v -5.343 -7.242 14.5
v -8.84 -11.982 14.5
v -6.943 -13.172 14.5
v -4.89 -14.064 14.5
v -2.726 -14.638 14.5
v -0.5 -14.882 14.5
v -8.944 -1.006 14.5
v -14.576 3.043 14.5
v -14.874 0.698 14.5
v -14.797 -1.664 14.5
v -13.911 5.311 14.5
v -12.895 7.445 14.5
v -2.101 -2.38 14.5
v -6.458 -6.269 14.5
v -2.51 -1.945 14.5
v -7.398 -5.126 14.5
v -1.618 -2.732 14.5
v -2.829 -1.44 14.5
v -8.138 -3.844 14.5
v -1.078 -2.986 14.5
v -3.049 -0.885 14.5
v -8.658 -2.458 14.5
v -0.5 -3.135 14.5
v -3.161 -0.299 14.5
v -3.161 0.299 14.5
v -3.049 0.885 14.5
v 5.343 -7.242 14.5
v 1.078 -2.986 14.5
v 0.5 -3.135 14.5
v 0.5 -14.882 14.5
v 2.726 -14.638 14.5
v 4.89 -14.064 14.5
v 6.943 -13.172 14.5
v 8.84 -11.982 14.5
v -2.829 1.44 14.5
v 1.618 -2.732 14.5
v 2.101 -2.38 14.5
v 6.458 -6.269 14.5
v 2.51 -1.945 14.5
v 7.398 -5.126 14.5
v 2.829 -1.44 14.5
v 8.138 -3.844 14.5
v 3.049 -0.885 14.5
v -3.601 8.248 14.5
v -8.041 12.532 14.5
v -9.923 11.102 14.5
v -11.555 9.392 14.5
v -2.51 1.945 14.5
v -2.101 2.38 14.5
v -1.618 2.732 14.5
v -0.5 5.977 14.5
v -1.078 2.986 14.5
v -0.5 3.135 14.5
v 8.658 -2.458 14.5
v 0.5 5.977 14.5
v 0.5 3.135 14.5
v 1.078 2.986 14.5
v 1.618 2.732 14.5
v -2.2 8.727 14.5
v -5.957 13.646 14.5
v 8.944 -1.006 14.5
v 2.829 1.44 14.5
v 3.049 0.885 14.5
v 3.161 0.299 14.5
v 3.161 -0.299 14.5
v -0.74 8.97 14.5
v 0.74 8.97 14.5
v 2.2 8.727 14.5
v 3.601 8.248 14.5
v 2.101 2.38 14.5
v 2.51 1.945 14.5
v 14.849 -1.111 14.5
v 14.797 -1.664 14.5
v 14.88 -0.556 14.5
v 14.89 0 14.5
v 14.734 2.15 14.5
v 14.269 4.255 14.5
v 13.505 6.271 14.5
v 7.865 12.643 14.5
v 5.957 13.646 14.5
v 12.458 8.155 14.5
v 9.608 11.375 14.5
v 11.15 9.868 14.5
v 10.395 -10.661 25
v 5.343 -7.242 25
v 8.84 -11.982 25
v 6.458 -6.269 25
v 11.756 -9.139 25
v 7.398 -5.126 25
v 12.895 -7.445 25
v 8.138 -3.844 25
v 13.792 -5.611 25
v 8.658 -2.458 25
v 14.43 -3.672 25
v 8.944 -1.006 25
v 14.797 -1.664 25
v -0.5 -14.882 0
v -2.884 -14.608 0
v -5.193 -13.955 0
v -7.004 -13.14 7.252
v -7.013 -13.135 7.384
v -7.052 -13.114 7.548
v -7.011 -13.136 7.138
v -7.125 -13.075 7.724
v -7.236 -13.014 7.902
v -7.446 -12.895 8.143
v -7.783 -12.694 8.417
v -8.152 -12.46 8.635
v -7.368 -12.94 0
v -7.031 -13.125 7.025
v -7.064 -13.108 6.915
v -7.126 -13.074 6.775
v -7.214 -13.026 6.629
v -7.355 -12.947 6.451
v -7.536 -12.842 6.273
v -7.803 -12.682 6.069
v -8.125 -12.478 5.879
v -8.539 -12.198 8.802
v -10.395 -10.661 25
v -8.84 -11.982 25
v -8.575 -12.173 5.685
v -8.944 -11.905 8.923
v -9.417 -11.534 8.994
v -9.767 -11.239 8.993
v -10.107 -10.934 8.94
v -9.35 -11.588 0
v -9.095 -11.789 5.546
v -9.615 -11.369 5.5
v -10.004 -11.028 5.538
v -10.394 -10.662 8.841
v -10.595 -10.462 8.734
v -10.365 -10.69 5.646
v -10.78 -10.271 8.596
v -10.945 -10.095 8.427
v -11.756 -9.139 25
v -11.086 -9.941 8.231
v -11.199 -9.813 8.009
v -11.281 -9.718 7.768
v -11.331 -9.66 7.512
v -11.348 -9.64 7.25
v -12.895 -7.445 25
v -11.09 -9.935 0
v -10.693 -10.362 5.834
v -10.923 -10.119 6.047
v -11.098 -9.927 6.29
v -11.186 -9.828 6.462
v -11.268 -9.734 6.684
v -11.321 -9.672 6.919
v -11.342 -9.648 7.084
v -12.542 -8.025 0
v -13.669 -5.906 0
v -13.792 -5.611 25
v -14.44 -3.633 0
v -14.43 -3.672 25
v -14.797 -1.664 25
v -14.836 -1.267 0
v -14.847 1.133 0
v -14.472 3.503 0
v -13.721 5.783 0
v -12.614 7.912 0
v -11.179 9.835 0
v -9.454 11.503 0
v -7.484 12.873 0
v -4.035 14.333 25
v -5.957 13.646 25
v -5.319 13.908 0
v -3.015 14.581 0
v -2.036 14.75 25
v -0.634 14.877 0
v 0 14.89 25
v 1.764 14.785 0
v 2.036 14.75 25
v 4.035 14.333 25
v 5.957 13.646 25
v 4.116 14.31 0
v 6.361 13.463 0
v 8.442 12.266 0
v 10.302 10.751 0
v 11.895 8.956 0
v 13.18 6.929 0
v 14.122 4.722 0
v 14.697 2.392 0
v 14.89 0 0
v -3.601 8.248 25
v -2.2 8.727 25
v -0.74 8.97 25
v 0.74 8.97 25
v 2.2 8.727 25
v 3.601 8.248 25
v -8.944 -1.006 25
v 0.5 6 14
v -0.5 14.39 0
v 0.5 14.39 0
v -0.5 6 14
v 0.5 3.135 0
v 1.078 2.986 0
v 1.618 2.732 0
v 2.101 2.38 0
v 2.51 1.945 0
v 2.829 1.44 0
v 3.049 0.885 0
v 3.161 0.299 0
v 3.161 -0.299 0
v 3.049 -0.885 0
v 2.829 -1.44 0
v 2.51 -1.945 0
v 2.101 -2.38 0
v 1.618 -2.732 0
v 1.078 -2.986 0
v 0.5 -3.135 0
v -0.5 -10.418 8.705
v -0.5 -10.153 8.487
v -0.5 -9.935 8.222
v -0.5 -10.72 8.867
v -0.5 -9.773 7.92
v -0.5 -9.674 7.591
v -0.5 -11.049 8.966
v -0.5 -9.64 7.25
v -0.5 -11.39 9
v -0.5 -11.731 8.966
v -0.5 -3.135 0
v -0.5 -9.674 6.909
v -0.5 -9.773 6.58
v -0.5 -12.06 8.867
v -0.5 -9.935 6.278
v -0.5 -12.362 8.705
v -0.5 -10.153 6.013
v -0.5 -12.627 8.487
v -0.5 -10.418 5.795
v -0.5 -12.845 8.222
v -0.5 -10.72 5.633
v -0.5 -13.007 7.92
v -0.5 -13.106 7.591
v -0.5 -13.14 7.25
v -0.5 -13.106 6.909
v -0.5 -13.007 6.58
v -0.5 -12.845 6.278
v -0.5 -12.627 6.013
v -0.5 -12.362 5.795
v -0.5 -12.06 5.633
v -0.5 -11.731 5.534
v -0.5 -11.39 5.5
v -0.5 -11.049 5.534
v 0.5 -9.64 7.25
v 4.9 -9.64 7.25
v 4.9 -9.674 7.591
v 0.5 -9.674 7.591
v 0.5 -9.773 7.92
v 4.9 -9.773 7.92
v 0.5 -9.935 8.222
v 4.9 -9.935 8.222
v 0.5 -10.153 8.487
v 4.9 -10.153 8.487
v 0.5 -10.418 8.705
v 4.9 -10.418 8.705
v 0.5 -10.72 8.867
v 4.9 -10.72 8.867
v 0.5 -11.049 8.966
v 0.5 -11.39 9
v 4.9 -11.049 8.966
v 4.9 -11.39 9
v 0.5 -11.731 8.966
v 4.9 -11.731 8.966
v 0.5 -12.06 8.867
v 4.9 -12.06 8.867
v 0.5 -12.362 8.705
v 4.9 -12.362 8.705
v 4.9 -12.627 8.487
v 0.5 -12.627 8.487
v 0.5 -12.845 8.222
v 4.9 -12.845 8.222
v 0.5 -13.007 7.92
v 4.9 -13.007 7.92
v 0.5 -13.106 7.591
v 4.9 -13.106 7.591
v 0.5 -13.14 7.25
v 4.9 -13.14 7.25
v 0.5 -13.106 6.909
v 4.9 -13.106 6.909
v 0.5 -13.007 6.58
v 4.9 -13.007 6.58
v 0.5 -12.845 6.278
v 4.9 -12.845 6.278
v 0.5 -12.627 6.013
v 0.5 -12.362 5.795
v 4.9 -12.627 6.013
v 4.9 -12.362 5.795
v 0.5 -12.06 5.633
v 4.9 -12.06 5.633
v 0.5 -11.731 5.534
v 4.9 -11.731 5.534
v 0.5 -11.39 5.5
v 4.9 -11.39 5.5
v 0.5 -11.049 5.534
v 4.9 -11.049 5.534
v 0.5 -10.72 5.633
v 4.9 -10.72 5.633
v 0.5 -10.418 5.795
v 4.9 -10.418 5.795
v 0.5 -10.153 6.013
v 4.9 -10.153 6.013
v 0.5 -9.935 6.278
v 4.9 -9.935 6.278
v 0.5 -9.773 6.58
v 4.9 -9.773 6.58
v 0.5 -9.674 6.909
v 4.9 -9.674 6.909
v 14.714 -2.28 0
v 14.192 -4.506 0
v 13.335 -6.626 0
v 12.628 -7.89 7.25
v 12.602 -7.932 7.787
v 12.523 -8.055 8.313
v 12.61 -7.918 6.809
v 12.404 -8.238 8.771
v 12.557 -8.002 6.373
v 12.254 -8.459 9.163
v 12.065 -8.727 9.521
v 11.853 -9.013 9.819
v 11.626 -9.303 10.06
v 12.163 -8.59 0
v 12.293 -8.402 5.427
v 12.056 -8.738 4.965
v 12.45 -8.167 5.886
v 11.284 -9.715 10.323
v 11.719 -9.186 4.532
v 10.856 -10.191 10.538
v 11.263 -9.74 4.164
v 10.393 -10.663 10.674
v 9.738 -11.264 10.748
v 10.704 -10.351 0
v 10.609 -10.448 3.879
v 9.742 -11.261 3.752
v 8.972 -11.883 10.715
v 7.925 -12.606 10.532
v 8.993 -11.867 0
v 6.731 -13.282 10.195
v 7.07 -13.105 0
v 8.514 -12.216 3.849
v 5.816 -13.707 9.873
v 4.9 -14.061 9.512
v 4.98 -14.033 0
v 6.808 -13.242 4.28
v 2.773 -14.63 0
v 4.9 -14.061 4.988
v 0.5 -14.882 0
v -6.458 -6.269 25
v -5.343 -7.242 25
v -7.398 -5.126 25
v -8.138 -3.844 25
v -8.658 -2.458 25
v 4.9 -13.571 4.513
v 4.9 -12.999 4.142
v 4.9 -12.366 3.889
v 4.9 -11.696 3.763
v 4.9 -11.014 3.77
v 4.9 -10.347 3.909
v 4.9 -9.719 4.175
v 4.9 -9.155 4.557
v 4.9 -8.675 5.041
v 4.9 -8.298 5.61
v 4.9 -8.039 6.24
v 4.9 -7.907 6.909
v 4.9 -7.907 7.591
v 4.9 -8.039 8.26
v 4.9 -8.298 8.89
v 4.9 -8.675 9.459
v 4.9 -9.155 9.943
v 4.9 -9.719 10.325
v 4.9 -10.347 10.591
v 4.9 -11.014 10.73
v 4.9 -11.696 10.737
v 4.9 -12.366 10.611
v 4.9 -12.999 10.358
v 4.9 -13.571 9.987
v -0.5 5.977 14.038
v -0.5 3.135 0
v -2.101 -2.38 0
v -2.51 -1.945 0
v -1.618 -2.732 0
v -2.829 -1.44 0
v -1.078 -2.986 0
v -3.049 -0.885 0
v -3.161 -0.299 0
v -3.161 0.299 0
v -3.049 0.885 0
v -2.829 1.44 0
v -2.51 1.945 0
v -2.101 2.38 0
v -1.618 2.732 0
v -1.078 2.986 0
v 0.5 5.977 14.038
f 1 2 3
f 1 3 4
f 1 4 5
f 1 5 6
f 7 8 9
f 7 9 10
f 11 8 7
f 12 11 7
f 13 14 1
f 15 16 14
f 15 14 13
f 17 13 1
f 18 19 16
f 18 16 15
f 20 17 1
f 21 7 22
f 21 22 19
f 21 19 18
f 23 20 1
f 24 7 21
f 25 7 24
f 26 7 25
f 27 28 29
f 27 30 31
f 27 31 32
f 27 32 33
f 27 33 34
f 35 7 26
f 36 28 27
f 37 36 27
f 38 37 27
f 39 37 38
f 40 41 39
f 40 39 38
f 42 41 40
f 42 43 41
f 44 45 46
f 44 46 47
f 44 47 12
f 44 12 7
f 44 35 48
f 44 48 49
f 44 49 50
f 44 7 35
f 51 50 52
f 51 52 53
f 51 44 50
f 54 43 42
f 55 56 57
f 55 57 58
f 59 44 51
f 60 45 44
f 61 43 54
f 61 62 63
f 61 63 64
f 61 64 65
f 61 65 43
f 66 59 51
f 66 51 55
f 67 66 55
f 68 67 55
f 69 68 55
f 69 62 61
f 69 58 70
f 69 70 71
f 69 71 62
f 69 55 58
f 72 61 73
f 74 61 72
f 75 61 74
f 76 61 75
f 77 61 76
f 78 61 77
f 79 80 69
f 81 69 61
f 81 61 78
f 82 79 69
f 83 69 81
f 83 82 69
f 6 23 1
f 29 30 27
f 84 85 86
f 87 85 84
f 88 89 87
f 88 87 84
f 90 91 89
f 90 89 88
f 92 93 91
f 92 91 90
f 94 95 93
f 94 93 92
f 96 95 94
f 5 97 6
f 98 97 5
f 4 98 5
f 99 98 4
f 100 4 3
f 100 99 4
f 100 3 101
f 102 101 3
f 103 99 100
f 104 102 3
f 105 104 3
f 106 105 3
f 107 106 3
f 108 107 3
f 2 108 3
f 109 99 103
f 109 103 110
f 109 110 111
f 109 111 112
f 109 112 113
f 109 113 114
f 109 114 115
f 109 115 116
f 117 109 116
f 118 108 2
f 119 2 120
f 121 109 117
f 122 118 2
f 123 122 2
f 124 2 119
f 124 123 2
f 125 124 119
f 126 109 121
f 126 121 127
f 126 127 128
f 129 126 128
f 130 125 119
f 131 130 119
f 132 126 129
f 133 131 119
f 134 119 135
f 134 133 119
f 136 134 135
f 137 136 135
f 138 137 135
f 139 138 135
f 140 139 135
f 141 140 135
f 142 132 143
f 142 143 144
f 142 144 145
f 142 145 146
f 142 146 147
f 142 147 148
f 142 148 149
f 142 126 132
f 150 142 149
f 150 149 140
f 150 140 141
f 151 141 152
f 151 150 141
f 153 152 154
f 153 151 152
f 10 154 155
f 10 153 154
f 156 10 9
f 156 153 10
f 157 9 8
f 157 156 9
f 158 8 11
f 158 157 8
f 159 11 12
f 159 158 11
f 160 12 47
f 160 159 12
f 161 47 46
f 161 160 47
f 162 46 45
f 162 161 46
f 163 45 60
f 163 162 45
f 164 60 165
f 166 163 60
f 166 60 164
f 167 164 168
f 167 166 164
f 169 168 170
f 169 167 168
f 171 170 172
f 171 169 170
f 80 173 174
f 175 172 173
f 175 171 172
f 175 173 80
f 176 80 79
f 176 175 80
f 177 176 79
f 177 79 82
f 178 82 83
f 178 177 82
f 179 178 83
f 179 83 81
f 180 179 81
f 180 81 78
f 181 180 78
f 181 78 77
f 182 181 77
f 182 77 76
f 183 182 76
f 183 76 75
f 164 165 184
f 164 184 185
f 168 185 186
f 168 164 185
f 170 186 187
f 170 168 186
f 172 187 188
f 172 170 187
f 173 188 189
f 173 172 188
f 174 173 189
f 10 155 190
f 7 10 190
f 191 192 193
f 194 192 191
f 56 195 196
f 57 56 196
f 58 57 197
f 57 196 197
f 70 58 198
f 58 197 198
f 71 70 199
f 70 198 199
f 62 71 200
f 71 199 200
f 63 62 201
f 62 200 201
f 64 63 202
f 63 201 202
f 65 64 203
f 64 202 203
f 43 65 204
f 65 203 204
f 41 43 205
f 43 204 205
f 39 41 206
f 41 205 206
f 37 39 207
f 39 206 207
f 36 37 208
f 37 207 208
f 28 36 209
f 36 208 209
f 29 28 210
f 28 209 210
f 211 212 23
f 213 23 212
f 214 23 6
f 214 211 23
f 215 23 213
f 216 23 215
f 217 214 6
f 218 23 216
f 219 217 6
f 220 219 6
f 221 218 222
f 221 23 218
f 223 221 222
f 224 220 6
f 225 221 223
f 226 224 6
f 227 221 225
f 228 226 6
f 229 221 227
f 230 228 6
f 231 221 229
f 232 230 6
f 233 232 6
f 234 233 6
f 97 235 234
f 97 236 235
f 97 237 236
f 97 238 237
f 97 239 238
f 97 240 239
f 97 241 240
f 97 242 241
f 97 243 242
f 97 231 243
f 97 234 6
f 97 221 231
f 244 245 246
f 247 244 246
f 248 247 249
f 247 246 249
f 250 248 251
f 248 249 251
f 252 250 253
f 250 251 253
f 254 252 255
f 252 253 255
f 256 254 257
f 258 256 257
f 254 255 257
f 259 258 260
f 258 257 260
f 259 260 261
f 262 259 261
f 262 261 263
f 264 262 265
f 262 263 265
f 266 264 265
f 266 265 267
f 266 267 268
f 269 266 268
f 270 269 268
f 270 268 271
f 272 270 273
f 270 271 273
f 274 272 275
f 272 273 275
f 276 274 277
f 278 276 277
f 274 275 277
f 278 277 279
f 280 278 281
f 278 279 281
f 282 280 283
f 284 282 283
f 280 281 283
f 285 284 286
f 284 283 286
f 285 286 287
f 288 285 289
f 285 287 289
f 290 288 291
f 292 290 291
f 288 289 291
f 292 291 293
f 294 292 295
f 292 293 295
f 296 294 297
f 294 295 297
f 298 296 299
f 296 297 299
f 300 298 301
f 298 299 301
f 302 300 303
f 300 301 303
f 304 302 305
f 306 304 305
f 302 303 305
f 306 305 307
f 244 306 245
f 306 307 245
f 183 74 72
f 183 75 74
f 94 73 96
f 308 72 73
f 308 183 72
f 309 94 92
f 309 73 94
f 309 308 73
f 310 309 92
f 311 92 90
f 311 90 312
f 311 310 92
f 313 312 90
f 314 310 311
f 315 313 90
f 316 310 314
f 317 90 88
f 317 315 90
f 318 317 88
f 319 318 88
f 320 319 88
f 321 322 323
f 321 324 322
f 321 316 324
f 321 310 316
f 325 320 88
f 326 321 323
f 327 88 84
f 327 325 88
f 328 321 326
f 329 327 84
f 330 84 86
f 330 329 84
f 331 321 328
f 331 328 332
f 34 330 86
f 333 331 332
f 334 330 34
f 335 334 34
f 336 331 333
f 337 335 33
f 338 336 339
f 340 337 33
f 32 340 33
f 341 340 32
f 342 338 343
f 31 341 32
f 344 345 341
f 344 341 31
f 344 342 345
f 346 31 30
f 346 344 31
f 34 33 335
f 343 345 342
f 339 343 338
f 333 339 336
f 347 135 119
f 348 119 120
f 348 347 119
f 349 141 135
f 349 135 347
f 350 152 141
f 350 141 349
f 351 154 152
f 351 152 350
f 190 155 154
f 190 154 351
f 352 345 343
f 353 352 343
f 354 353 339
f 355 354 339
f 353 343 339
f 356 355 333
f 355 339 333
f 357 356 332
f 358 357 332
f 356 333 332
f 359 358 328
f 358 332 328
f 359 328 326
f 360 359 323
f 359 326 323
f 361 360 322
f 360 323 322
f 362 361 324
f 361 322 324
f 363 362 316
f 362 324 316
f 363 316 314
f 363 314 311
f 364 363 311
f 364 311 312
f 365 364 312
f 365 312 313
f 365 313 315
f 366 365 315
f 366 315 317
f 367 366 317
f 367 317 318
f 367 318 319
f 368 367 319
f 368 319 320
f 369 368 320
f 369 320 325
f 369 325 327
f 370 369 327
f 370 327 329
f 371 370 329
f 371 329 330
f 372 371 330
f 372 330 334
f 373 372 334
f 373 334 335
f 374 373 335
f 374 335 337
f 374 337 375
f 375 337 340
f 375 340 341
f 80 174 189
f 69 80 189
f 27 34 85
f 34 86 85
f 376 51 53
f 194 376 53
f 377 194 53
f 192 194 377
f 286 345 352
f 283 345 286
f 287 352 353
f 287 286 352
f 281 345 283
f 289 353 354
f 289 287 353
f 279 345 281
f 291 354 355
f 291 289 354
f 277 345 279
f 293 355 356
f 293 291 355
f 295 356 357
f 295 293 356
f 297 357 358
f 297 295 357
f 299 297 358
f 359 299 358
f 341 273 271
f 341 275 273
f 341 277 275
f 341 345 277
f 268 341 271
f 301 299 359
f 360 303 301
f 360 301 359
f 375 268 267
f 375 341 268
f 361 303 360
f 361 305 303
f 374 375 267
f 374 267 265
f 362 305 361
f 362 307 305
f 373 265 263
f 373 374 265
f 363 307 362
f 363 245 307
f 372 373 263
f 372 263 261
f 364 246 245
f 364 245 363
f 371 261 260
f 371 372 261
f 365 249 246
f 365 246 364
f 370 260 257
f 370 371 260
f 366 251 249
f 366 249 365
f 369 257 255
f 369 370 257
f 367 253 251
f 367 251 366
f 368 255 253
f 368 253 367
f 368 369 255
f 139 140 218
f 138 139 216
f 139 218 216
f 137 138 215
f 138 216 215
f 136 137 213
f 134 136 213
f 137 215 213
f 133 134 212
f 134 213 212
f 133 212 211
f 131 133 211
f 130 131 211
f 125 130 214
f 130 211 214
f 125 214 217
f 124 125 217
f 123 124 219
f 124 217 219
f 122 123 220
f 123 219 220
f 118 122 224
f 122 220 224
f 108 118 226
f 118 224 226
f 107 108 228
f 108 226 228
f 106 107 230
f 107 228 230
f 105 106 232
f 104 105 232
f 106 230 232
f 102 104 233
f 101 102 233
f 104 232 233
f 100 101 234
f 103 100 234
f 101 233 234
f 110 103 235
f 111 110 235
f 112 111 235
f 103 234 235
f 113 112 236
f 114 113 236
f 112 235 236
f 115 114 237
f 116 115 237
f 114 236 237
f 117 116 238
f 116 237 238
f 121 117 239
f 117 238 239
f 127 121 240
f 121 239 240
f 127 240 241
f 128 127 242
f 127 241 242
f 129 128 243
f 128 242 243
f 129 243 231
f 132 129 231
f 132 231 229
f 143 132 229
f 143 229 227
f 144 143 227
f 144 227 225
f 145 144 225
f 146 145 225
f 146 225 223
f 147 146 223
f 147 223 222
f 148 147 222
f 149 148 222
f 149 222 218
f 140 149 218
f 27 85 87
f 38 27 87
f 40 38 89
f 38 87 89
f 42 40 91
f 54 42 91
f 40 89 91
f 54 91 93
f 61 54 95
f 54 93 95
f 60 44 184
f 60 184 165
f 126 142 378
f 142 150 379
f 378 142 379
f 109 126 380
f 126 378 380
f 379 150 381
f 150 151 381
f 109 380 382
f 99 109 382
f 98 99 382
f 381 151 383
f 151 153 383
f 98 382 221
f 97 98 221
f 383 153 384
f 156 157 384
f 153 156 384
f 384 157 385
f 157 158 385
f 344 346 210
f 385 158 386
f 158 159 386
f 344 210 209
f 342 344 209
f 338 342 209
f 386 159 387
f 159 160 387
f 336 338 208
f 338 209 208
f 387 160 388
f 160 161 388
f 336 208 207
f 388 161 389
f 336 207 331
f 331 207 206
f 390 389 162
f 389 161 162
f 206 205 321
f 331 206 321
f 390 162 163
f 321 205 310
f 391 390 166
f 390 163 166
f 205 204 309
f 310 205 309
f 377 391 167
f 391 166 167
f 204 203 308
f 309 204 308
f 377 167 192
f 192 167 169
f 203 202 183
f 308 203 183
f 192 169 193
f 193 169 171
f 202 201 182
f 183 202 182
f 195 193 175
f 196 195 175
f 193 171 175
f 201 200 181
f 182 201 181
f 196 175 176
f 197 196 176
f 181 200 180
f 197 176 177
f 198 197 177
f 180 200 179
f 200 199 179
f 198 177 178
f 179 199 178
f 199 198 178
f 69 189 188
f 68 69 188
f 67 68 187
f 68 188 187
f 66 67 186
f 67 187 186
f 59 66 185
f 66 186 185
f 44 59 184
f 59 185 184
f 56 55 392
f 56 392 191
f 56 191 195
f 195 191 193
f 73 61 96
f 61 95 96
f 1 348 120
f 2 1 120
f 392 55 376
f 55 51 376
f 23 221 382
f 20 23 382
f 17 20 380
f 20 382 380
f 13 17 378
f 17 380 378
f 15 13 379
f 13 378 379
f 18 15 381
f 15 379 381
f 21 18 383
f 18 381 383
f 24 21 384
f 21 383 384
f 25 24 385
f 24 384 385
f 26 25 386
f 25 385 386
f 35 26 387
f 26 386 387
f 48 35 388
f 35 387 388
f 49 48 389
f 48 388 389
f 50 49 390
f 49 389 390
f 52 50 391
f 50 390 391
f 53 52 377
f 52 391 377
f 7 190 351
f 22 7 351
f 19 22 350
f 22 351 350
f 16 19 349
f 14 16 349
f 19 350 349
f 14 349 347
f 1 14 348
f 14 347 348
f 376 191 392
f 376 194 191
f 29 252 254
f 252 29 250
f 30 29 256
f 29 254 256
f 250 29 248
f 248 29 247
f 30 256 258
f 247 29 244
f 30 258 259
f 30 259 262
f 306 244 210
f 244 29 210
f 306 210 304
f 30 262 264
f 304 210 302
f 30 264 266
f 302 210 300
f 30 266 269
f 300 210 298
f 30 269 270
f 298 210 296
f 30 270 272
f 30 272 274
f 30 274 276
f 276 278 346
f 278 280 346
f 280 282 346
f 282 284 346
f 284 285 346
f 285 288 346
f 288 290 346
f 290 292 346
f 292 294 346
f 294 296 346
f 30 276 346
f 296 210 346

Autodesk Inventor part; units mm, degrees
ref_plane "XZ Plane" through (0, 0, 0) normal (0, 1, 0) x (-1, 0, 0)
ref_plane "XY Plane" through (0, 0, 0) normal (0, 0, 1) x (1, 0, 0)
sketch "Sketch1" plane through (0, 0, 0) normal (0, 0, 1) x (1, 0, 0)
  circle A0 centre (0, 0) radius 14.89
  circle A1 centre (0, 0) radius 6
  circle A2 centre (0, 0) radius 3.175
  dimension "d0" = 29.78
  dimension "d1" = 12
  dimension "d41" = 6.35
extrude "Extrusion1" add sketch "Sketch1" along normal blind 25 contours A0 | A1
sketch "Sketch2" plane through (0, 0, 25) normal (0, 0, 1) x (1, 0, 0)
  circle A0 centre (0, 0) radius 14.89 projected
  circle A1 centre (0, 0) radius 9
  circle A2 centre (0, 0) radius 14.89 projected
  line L0 (-3.6007, 8.2483) -> (-5.9571, 13.6464)
  line L1 (5.9571, 13.6464) -> (3.6007, 8.2483)
  line L2 (-5.3429, -7.2425) -> (-8.8396, -11.9822)
  line L3 (-14.7967, -1.6642) -> (-8.9436, -1.0059)
  line L4 (8.9436, -1.0059) -> (14.7967, -1.6642)
  line L5 (8.8396, -11.9822) -> (5.3429, -7.2425)
  dimension "d14" = 18
  dimension "d24" = 360
extrude "Extrusion2" cut sketch "Sketch2" against normal blind 10.5 contours A0 L4 A1 L1 | L0 A1 L3 A0 | A1 | A0 L2 A1 L5
ref_plane "Work Plane1" through (14.9, 0, 0) normal (1, 0, 0) x (0, 1, 0)
sketch "Sketch3" plane through (14.9, 0, 0) normal (1, 0, 0) x (0, 1, 0)
  line L0 (-1.6642, 14.5) -> (-1.6642, 25) projected
  line L1 (-11.9822, 25) -> (-1.6642, 25) projected
  line L2 (-11.9822, 25) -> (-11.9822, 14.5) projected
  line L3 (-11.9822, 14.5) -> (-11.9822, 14.5) projected
  line L4 (-11.9822, 14.5) -> (-11.9822, 25) projected
  line L5 (-1.6642, 25) -> (-11.9822, 25) projected
  line L6 (-1.6642, 25) -> (-1.6642, 14.5) projected
  line L7 (-1.6642, 14.5) -> (13.6464, 14.5) projected
  line L8 (13.6464, 14.5) -> (13.6464, 25) projected
  line L9 (13.6464, 25) -> (13.6464, 25) projected
  line L10 (13.6464, 25) -> (13.6464, 14.5) projected
  line L11 (13.6464, 14.5) -> (-1.6642, 14.5) projected
  line L12 (14.89, 0) -> (-14.89, 0) projected
  line L13 (14.89, 25) -> (13.6464, 25) projected
  line L14 (14.89, 25) -> (14.89, 0)
  line L15 (14.89, 0) -> (14.89, 25) projected
  line L16 (-14.89, 0) -> (-14.89, 14.5) projected
  line L17 (14.89, 0) -> (-14.89, 0) projected
  line L18 (-14.89, 14.5) -> (-14.89, 0)
  line L19 (-7.89, 0) -> (-14.89, 0)
  line L20 (-14.89, 0) -> (-14.89, 14.5)
  line L21 (-14.89, 7.25) -> (-7.89, 7.25)
  circle A0 centre (-11.39, 7.25) radius 3.5
  circle A1 centre (-11.39, 7.25) radius 1.75
  point P0 (0, 0)
  dimension "d27" = 29.78
  dimension "d30" = 3.5
extrude "Extrusion3" cut sketch "Sketch3" against normal blind 10
extrude "Extrusion4" cut sketch "Sketch3" against normal blind 30 contours A1 L21 | L21 A1
sketch "Sketch4" plane through (0, 0, 0) normal (0, 0, -1) x (-1, 0, 0)
  arc A0 (-8.8396, -11.9822) -> (8.8396, -11.9822) centre (0, 0) ccw projected
  line L0 (0, 0) -> (-0.5, 0)
  line L1 (-0.5, 0) -> (-0.5, -14.8816)
  line L2 (0, 0) -> (0.5, 0)
  line L3 (0.5, 0) -> (0.5, -14.8816)
  line L4 (-0.5, 0) -> (-0.5, 14.8816)
  line L5 (0.5, 0) -> (0.5, 14.8816)
  arc A1 (5.3429, -7.2425) -> (8.9436, -1.0059) centre (0, 0) ccw projected
  circle A2 centre (0, 0) radius 14.89 projected
  point P0 (-8.8396, 11.9822)
  dimension "d33" = 0.5
  dimension "d34" = 0.5
extrude "Extrusion5" cut sketch "Sketch4" against normal blind 15 contours L1 L0 L2 L3 A0
sketch "Sketch5" plane through (-0.5, -14.8816, 0) normal (1, 0, 0) x (0, 0, -1)
  line L0 (0, 0) -> (-14.5, 0) projected
  line L1 (-14.5, 0) -> (-14.5, 2.8994) projected
  line L2 (-14.5, 2.8994) -> (-25, 2.8994) projected
  line L3 (-25, 13.2174) -> (-25, 2.8994) projected
  line L4 (-25, 13.2174) -> (-14.5, 13.2174) projected
  line L5 (-14.5, 13.2174) -> (-14.5, 28.528) projected
  line L6 (-14.5, 28.528) -> (-25, 28.528) projected
  line L7 (-25, 28.528) -> (-25, 28.528) projected
  line L8 (-25, 28.528) -> (-14.5, 28.528) projected
  line L9 (-14.5, 28.528) -> (-14.5, 13.2174) projected
  line L10 (-14.5, 13.2174) -> (-25, 13.2174) projected
  line L11 (-25, 2.8994) -> (-25, 13.2174) projected
  line L12 (-25, 2.8994) -> (-14.5, 2.8994) projected
  line L13 (-14.5, 2.8994) -> (-14.5, 0) projected
  line L14 (-14.5, 0) -> (0, 0) projected
  line L15 (0, 0) -> (0, 0) projected
  line L16 (-4.9878, 0.8209) -> (-9.5122, 0.8209) projected
  line L17 (-14.5, 8.9025) -> (0, 8.9025) projected
  line L18 (0, 8.9025) -> (0, 8.9025) projected
  line L19 (0, 8.9025) -> (-14.5, 8.9025) projected
  line L20 (-14.5, 8.9025) -> (-14.5, 8.9025) projected
  line L21 (-14.5, 20.8816) -> (-14.5, 8.9025) projected
  line L22 (-14.5, 20.8816) -> (0, 20.8816)
  line L23 (0, 29.7716) -> (0, 0) projected
  line L24 (-14.5, 20.8816) -> (-14, 20.8816)
  line L25 (0, 29.7716) -> (0, 29.2716)
  line L26 (0, 29.2716) -> (-14, 20.8816)
  line L27 (-14.5, 20.8585) -> (0, 20.8585)
  line L28 (0, 8.9025) -> (0, 20.8816) projected
  line L29 (-14, 20.8816) -> (-14.0385, 20.8585)
  line L30 (-14.5, 18.0566) -> (0, 18.0566) projected
  line L31 (-14.5, 18.0566) -> (-14.5, 11.7462) projected
  line L32 (-14.5, 18.0145) -> (0, 18.0145)
  line L33 (-14.5, 18.0145) -> (-14, 18.0145)
  line L34 (-14, 18.0145) -> (0, 29.2716)
  point P0 (0, 14.8816)
  point P1 (-13.9476, 18.0566)
  dimension "d37" = 0.5
  dimension "d38" = 0.5
  dimension "d42" = 0.5
extrude "Extrusion6" cut sketch "Sketch5" along normal blind 1 contours L32 L34 L30 L23 | L30 L34 L27 L23 | L32 L5 L30 L34 | L27 L34 L22 L23 | L30 L5 L27 L34 | L22 L34 L23 | L27 L29 L22 L34 | L22 L26 L34
properties part number "PHAN NHOM 6"
